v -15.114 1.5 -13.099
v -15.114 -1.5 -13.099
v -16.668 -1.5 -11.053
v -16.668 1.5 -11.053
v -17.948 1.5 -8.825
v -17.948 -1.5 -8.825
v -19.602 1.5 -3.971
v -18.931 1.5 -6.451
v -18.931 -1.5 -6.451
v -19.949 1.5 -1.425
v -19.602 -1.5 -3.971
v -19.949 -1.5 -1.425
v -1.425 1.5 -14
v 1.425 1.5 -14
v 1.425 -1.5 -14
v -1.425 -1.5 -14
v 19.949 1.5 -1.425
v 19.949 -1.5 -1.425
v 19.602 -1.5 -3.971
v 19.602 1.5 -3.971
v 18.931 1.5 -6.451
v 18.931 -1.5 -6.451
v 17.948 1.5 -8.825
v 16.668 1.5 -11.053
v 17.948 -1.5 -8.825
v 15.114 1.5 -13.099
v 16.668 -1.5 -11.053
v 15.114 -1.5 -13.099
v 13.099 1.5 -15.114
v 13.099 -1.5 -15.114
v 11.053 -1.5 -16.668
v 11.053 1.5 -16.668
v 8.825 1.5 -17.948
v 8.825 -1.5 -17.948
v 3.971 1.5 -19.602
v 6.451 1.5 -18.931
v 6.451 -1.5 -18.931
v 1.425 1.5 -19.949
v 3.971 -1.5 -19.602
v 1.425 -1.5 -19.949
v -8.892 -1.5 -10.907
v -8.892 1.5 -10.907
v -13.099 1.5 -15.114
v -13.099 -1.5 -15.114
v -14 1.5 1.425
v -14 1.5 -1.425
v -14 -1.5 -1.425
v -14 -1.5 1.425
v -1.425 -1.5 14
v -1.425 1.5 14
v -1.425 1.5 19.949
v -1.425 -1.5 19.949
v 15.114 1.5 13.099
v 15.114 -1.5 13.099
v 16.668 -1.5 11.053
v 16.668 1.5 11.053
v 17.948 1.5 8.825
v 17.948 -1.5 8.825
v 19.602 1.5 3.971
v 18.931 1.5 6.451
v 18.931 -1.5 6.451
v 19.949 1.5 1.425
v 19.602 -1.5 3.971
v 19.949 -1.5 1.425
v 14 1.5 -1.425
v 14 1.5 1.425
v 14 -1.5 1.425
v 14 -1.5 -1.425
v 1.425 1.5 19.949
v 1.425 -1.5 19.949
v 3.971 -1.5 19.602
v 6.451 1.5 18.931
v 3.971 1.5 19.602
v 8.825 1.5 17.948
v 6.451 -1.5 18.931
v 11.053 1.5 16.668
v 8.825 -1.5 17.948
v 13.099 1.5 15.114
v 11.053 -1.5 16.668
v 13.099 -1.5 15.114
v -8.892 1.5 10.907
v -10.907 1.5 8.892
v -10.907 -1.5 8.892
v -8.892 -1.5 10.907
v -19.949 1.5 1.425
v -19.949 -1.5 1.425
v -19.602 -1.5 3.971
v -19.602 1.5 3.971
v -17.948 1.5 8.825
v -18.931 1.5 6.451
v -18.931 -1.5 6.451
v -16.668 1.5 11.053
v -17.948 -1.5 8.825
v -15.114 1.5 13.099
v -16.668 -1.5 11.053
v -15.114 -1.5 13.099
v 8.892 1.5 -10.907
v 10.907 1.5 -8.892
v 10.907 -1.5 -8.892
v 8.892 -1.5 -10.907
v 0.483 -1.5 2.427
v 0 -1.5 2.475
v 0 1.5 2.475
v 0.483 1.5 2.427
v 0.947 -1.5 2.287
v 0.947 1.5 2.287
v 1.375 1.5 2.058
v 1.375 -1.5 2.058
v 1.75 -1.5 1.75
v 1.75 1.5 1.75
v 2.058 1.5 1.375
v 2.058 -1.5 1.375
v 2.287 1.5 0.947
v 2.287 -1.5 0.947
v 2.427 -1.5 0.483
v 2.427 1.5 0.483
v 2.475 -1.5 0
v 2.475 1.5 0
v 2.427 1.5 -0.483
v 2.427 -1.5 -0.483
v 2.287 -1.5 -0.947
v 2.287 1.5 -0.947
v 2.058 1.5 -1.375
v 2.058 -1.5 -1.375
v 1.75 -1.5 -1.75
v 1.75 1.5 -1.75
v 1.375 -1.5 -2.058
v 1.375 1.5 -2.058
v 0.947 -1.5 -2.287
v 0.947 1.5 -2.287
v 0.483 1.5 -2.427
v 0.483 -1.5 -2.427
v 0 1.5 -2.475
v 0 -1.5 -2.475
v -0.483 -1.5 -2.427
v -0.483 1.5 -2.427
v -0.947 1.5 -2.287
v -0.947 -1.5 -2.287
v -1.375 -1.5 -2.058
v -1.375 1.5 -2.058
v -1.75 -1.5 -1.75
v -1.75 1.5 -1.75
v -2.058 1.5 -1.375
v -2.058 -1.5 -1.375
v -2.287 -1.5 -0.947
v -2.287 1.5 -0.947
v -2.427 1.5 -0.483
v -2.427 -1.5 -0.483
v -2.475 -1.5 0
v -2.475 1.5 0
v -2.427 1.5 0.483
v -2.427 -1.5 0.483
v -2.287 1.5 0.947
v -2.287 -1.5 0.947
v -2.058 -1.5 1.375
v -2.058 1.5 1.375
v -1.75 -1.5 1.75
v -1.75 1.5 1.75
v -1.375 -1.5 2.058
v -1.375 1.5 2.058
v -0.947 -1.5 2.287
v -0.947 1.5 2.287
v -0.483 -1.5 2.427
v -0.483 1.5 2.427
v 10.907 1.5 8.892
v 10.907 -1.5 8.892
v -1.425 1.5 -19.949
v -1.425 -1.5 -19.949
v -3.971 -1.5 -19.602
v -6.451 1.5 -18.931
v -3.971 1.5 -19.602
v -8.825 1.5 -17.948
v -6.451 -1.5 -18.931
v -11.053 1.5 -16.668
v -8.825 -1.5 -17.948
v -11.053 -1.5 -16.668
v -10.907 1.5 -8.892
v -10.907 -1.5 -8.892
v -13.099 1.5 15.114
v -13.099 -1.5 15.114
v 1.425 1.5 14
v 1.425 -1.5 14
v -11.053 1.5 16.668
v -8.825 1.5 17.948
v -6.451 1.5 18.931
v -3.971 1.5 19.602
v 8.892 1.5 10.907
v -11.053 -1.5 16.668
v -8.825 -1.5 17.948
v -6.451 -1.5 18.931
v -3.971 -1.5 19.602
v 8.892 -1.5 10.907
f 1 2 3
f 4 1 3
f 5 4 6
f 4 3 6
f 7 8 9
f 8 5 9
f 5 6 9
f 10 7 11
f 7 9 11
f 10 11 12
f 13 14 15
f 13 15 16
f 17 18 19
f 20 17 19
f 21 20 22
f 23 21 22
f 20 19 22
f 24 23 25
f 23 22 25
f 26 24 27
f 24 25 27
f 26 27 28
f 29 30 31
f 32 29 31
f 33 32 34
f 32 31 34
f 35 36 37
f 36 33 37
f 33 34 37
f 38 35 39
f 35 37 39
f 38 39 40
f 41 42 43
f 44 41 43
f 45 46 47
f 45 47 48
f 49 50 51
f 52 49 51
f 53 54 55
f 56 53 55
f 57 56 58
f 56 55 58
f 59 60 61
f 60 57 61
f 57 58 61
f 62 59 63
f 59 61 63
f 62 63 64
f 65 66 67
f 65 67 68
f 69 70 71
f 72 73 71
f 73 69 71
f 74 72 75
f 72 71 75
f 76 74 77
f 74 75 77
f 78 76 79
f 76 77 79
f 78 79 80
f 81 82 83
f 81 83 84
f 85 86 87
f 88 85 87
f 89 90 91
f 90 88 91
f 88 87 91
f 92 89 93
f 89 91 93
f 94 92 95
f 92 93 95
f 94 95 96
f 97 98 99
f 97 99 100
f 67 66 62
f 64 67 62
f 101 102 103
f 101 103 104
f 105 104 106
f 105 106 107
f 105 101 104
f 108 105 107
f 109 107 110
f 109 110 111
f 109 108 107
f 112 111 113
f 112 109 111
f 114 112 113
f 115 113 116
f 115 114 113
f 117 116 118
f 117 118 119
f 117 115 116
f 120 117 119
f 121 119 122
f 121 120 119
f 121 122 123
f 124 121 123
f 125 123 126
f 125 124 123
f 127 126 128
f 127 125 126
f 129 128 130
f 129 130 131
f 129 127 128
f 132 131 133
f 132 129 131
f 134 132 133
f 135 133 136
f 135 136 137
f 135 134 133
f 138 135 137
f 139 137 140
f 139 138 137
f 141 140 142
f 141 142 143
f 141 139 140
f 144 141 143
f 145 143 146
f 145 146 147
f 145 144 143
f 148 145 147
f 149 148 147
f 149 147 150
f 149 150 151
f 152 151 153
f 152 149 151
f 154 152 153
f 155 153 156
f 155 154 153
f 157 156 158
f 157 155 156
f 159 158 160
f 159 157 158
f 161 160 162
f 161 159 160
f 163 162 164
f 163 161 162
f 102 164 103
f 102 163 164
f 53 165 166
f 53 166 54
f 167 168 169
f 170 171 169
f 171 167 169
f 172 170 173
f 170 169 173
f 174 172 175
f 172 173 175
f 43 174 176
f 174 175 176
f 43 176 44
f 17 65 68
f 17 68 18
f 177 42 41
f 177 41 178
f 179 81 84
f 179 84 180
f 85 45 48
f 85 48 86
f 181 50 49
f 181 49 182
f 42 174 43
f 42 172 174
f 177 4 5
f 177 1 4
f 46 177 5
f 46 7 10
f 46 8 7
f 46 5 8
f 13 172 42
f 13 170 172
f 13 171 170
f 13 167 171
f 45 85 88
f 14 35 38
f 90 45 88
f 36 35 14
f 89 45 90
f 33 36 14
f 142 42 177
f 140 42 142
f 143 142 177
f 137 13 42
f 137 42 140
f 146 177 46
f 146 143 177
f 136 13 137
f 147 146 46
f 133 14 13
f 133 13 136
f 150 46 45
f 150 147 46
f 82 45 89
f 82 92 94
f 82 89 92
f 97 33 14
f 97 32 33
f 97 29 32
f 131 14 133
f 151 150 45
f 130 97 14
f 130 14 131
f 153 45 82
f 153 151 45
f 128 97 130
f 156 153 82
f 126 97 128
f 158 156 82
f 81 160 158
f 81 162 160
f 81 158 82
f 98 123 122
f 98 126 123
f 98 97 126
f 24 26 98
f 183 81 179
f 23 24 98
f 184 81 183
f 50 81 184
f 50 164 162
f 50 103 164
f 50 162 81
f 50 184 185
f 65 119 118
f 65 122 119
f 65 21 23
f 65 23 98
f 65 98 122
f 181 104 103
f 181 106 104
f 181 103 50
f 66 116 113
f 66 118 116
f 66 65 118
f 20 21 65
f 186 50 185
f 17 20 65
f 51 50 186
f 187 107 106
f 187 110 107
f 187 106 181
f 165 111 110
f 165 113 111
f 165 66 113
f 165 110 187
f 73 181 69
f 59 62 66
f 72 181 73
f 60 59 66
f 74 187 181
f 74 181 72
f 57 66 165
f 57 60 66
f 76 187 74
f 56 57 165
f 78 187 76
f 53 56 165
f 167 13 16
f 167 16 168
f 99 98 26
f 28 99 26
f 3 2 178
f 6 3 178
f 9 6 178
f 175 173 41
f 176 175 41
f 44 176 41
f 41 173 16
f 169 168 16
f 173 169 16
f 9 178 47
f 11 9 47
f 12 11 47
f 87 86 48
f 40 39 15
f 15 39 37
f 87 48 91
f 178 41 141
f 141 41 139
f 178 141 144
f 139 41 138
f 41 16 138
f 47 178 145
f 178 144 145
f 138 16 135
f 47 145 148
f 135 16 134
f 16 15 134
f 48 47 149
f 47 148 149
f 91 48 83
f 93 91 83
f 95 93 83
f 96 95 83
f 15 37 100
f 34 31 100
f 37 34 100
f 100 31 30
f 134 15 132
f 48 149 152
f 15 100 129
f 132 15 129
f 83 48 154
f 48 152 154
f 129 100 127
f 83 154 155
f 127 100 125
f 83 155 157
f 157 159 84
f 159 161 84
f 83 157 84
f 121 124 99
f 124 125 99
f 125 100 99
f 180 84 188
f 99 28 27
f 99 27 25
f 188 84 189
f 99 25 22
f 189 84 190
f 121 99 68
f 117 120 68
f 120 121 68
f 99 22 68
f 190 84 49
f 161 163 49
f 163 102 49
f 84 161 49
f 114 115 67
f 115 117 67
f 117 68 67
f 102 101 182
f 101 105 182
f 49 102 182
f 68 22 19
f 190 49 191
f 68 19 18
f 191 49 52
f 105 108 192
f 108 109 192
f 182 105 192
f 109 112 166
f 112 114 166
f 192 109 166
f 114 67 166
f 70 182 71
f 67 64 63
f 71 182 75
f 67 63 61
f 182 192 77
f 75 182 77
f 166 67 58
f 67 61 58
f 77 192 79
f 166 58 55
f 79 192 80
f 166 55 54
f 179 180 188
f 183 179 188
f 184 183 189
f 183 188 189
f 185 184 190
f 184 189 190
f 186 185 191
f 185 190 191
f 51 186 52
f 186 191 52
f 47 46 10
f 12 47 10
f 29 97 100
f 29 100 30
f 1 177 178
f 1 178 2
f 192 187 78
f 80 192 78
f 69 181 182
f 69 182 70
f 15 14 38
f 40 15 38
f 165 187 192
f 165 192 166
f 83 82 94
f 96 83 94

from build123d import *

# Parameters (mm, degrees)
BOSS_EXTRUDE1_DEPTH      = 1.5
BOSS_EXTRUDE1_DEPTH_BACK = 1.5
SKETCH1_R                = 20
SKETCH1_R_2              = 2.475
SKETCH2_W                = 12
SKETCH2_H                = 2.85
CUT_EXTRUDE1_DEPTH       = 29.442925307
CIRPATTERN1_COUNT        = 8


with BuildPart() as part:
    # Sketch1 → Boss-Extrude1 (new, two sides: drawn at the far end of the back side and taken through both)
    with BuildSketch(Plane(origin=(0, 0, 0), x_dir=(1, 0, 0), z_dir=(0, 1, 0)).offset(-BOSS_EXTRUDE1_DEPTH_BACK)):
        Circle(SKETCH1_R)
        Circle(SKETCH1_R_2, mode=Mode.SUBTRACT)
    extrude(amount=BOSS_EXTRUDE1_DEPTH + BOSS_EXTRUDE1_DEPTH_BACK)

    # Sketch2 → Cut-Extrude1 (cut, through all)
    with BuildSketch(Plane(origin=(0, 1.5, 0), x_dir=(1, 0, 0), z_dir=(0, 1, 0))):
        with Locations((20, 0)):
            Rectangle(SKETCH2_W, SKETCH2_H)
    cut_extrude1 = extrude(amount=-CUT_EXTRUDE1_DEPTH, mode=Mode.SUBTRACT)

    # CirPattern1: Cut-Extrude1 ×8 about axis
    cirpattern1_axis = Axis((0, 1.74625, 0), (0, -1, 0))
    for i in range(1, CIRPATTERN1_COUNT):
        add(cut_extrude1.rotate(cirpattern1_axis, i * 360 / CIRPATTERN1_COUNT), mode=Mode.SUBTRACT)


solid = part.part
